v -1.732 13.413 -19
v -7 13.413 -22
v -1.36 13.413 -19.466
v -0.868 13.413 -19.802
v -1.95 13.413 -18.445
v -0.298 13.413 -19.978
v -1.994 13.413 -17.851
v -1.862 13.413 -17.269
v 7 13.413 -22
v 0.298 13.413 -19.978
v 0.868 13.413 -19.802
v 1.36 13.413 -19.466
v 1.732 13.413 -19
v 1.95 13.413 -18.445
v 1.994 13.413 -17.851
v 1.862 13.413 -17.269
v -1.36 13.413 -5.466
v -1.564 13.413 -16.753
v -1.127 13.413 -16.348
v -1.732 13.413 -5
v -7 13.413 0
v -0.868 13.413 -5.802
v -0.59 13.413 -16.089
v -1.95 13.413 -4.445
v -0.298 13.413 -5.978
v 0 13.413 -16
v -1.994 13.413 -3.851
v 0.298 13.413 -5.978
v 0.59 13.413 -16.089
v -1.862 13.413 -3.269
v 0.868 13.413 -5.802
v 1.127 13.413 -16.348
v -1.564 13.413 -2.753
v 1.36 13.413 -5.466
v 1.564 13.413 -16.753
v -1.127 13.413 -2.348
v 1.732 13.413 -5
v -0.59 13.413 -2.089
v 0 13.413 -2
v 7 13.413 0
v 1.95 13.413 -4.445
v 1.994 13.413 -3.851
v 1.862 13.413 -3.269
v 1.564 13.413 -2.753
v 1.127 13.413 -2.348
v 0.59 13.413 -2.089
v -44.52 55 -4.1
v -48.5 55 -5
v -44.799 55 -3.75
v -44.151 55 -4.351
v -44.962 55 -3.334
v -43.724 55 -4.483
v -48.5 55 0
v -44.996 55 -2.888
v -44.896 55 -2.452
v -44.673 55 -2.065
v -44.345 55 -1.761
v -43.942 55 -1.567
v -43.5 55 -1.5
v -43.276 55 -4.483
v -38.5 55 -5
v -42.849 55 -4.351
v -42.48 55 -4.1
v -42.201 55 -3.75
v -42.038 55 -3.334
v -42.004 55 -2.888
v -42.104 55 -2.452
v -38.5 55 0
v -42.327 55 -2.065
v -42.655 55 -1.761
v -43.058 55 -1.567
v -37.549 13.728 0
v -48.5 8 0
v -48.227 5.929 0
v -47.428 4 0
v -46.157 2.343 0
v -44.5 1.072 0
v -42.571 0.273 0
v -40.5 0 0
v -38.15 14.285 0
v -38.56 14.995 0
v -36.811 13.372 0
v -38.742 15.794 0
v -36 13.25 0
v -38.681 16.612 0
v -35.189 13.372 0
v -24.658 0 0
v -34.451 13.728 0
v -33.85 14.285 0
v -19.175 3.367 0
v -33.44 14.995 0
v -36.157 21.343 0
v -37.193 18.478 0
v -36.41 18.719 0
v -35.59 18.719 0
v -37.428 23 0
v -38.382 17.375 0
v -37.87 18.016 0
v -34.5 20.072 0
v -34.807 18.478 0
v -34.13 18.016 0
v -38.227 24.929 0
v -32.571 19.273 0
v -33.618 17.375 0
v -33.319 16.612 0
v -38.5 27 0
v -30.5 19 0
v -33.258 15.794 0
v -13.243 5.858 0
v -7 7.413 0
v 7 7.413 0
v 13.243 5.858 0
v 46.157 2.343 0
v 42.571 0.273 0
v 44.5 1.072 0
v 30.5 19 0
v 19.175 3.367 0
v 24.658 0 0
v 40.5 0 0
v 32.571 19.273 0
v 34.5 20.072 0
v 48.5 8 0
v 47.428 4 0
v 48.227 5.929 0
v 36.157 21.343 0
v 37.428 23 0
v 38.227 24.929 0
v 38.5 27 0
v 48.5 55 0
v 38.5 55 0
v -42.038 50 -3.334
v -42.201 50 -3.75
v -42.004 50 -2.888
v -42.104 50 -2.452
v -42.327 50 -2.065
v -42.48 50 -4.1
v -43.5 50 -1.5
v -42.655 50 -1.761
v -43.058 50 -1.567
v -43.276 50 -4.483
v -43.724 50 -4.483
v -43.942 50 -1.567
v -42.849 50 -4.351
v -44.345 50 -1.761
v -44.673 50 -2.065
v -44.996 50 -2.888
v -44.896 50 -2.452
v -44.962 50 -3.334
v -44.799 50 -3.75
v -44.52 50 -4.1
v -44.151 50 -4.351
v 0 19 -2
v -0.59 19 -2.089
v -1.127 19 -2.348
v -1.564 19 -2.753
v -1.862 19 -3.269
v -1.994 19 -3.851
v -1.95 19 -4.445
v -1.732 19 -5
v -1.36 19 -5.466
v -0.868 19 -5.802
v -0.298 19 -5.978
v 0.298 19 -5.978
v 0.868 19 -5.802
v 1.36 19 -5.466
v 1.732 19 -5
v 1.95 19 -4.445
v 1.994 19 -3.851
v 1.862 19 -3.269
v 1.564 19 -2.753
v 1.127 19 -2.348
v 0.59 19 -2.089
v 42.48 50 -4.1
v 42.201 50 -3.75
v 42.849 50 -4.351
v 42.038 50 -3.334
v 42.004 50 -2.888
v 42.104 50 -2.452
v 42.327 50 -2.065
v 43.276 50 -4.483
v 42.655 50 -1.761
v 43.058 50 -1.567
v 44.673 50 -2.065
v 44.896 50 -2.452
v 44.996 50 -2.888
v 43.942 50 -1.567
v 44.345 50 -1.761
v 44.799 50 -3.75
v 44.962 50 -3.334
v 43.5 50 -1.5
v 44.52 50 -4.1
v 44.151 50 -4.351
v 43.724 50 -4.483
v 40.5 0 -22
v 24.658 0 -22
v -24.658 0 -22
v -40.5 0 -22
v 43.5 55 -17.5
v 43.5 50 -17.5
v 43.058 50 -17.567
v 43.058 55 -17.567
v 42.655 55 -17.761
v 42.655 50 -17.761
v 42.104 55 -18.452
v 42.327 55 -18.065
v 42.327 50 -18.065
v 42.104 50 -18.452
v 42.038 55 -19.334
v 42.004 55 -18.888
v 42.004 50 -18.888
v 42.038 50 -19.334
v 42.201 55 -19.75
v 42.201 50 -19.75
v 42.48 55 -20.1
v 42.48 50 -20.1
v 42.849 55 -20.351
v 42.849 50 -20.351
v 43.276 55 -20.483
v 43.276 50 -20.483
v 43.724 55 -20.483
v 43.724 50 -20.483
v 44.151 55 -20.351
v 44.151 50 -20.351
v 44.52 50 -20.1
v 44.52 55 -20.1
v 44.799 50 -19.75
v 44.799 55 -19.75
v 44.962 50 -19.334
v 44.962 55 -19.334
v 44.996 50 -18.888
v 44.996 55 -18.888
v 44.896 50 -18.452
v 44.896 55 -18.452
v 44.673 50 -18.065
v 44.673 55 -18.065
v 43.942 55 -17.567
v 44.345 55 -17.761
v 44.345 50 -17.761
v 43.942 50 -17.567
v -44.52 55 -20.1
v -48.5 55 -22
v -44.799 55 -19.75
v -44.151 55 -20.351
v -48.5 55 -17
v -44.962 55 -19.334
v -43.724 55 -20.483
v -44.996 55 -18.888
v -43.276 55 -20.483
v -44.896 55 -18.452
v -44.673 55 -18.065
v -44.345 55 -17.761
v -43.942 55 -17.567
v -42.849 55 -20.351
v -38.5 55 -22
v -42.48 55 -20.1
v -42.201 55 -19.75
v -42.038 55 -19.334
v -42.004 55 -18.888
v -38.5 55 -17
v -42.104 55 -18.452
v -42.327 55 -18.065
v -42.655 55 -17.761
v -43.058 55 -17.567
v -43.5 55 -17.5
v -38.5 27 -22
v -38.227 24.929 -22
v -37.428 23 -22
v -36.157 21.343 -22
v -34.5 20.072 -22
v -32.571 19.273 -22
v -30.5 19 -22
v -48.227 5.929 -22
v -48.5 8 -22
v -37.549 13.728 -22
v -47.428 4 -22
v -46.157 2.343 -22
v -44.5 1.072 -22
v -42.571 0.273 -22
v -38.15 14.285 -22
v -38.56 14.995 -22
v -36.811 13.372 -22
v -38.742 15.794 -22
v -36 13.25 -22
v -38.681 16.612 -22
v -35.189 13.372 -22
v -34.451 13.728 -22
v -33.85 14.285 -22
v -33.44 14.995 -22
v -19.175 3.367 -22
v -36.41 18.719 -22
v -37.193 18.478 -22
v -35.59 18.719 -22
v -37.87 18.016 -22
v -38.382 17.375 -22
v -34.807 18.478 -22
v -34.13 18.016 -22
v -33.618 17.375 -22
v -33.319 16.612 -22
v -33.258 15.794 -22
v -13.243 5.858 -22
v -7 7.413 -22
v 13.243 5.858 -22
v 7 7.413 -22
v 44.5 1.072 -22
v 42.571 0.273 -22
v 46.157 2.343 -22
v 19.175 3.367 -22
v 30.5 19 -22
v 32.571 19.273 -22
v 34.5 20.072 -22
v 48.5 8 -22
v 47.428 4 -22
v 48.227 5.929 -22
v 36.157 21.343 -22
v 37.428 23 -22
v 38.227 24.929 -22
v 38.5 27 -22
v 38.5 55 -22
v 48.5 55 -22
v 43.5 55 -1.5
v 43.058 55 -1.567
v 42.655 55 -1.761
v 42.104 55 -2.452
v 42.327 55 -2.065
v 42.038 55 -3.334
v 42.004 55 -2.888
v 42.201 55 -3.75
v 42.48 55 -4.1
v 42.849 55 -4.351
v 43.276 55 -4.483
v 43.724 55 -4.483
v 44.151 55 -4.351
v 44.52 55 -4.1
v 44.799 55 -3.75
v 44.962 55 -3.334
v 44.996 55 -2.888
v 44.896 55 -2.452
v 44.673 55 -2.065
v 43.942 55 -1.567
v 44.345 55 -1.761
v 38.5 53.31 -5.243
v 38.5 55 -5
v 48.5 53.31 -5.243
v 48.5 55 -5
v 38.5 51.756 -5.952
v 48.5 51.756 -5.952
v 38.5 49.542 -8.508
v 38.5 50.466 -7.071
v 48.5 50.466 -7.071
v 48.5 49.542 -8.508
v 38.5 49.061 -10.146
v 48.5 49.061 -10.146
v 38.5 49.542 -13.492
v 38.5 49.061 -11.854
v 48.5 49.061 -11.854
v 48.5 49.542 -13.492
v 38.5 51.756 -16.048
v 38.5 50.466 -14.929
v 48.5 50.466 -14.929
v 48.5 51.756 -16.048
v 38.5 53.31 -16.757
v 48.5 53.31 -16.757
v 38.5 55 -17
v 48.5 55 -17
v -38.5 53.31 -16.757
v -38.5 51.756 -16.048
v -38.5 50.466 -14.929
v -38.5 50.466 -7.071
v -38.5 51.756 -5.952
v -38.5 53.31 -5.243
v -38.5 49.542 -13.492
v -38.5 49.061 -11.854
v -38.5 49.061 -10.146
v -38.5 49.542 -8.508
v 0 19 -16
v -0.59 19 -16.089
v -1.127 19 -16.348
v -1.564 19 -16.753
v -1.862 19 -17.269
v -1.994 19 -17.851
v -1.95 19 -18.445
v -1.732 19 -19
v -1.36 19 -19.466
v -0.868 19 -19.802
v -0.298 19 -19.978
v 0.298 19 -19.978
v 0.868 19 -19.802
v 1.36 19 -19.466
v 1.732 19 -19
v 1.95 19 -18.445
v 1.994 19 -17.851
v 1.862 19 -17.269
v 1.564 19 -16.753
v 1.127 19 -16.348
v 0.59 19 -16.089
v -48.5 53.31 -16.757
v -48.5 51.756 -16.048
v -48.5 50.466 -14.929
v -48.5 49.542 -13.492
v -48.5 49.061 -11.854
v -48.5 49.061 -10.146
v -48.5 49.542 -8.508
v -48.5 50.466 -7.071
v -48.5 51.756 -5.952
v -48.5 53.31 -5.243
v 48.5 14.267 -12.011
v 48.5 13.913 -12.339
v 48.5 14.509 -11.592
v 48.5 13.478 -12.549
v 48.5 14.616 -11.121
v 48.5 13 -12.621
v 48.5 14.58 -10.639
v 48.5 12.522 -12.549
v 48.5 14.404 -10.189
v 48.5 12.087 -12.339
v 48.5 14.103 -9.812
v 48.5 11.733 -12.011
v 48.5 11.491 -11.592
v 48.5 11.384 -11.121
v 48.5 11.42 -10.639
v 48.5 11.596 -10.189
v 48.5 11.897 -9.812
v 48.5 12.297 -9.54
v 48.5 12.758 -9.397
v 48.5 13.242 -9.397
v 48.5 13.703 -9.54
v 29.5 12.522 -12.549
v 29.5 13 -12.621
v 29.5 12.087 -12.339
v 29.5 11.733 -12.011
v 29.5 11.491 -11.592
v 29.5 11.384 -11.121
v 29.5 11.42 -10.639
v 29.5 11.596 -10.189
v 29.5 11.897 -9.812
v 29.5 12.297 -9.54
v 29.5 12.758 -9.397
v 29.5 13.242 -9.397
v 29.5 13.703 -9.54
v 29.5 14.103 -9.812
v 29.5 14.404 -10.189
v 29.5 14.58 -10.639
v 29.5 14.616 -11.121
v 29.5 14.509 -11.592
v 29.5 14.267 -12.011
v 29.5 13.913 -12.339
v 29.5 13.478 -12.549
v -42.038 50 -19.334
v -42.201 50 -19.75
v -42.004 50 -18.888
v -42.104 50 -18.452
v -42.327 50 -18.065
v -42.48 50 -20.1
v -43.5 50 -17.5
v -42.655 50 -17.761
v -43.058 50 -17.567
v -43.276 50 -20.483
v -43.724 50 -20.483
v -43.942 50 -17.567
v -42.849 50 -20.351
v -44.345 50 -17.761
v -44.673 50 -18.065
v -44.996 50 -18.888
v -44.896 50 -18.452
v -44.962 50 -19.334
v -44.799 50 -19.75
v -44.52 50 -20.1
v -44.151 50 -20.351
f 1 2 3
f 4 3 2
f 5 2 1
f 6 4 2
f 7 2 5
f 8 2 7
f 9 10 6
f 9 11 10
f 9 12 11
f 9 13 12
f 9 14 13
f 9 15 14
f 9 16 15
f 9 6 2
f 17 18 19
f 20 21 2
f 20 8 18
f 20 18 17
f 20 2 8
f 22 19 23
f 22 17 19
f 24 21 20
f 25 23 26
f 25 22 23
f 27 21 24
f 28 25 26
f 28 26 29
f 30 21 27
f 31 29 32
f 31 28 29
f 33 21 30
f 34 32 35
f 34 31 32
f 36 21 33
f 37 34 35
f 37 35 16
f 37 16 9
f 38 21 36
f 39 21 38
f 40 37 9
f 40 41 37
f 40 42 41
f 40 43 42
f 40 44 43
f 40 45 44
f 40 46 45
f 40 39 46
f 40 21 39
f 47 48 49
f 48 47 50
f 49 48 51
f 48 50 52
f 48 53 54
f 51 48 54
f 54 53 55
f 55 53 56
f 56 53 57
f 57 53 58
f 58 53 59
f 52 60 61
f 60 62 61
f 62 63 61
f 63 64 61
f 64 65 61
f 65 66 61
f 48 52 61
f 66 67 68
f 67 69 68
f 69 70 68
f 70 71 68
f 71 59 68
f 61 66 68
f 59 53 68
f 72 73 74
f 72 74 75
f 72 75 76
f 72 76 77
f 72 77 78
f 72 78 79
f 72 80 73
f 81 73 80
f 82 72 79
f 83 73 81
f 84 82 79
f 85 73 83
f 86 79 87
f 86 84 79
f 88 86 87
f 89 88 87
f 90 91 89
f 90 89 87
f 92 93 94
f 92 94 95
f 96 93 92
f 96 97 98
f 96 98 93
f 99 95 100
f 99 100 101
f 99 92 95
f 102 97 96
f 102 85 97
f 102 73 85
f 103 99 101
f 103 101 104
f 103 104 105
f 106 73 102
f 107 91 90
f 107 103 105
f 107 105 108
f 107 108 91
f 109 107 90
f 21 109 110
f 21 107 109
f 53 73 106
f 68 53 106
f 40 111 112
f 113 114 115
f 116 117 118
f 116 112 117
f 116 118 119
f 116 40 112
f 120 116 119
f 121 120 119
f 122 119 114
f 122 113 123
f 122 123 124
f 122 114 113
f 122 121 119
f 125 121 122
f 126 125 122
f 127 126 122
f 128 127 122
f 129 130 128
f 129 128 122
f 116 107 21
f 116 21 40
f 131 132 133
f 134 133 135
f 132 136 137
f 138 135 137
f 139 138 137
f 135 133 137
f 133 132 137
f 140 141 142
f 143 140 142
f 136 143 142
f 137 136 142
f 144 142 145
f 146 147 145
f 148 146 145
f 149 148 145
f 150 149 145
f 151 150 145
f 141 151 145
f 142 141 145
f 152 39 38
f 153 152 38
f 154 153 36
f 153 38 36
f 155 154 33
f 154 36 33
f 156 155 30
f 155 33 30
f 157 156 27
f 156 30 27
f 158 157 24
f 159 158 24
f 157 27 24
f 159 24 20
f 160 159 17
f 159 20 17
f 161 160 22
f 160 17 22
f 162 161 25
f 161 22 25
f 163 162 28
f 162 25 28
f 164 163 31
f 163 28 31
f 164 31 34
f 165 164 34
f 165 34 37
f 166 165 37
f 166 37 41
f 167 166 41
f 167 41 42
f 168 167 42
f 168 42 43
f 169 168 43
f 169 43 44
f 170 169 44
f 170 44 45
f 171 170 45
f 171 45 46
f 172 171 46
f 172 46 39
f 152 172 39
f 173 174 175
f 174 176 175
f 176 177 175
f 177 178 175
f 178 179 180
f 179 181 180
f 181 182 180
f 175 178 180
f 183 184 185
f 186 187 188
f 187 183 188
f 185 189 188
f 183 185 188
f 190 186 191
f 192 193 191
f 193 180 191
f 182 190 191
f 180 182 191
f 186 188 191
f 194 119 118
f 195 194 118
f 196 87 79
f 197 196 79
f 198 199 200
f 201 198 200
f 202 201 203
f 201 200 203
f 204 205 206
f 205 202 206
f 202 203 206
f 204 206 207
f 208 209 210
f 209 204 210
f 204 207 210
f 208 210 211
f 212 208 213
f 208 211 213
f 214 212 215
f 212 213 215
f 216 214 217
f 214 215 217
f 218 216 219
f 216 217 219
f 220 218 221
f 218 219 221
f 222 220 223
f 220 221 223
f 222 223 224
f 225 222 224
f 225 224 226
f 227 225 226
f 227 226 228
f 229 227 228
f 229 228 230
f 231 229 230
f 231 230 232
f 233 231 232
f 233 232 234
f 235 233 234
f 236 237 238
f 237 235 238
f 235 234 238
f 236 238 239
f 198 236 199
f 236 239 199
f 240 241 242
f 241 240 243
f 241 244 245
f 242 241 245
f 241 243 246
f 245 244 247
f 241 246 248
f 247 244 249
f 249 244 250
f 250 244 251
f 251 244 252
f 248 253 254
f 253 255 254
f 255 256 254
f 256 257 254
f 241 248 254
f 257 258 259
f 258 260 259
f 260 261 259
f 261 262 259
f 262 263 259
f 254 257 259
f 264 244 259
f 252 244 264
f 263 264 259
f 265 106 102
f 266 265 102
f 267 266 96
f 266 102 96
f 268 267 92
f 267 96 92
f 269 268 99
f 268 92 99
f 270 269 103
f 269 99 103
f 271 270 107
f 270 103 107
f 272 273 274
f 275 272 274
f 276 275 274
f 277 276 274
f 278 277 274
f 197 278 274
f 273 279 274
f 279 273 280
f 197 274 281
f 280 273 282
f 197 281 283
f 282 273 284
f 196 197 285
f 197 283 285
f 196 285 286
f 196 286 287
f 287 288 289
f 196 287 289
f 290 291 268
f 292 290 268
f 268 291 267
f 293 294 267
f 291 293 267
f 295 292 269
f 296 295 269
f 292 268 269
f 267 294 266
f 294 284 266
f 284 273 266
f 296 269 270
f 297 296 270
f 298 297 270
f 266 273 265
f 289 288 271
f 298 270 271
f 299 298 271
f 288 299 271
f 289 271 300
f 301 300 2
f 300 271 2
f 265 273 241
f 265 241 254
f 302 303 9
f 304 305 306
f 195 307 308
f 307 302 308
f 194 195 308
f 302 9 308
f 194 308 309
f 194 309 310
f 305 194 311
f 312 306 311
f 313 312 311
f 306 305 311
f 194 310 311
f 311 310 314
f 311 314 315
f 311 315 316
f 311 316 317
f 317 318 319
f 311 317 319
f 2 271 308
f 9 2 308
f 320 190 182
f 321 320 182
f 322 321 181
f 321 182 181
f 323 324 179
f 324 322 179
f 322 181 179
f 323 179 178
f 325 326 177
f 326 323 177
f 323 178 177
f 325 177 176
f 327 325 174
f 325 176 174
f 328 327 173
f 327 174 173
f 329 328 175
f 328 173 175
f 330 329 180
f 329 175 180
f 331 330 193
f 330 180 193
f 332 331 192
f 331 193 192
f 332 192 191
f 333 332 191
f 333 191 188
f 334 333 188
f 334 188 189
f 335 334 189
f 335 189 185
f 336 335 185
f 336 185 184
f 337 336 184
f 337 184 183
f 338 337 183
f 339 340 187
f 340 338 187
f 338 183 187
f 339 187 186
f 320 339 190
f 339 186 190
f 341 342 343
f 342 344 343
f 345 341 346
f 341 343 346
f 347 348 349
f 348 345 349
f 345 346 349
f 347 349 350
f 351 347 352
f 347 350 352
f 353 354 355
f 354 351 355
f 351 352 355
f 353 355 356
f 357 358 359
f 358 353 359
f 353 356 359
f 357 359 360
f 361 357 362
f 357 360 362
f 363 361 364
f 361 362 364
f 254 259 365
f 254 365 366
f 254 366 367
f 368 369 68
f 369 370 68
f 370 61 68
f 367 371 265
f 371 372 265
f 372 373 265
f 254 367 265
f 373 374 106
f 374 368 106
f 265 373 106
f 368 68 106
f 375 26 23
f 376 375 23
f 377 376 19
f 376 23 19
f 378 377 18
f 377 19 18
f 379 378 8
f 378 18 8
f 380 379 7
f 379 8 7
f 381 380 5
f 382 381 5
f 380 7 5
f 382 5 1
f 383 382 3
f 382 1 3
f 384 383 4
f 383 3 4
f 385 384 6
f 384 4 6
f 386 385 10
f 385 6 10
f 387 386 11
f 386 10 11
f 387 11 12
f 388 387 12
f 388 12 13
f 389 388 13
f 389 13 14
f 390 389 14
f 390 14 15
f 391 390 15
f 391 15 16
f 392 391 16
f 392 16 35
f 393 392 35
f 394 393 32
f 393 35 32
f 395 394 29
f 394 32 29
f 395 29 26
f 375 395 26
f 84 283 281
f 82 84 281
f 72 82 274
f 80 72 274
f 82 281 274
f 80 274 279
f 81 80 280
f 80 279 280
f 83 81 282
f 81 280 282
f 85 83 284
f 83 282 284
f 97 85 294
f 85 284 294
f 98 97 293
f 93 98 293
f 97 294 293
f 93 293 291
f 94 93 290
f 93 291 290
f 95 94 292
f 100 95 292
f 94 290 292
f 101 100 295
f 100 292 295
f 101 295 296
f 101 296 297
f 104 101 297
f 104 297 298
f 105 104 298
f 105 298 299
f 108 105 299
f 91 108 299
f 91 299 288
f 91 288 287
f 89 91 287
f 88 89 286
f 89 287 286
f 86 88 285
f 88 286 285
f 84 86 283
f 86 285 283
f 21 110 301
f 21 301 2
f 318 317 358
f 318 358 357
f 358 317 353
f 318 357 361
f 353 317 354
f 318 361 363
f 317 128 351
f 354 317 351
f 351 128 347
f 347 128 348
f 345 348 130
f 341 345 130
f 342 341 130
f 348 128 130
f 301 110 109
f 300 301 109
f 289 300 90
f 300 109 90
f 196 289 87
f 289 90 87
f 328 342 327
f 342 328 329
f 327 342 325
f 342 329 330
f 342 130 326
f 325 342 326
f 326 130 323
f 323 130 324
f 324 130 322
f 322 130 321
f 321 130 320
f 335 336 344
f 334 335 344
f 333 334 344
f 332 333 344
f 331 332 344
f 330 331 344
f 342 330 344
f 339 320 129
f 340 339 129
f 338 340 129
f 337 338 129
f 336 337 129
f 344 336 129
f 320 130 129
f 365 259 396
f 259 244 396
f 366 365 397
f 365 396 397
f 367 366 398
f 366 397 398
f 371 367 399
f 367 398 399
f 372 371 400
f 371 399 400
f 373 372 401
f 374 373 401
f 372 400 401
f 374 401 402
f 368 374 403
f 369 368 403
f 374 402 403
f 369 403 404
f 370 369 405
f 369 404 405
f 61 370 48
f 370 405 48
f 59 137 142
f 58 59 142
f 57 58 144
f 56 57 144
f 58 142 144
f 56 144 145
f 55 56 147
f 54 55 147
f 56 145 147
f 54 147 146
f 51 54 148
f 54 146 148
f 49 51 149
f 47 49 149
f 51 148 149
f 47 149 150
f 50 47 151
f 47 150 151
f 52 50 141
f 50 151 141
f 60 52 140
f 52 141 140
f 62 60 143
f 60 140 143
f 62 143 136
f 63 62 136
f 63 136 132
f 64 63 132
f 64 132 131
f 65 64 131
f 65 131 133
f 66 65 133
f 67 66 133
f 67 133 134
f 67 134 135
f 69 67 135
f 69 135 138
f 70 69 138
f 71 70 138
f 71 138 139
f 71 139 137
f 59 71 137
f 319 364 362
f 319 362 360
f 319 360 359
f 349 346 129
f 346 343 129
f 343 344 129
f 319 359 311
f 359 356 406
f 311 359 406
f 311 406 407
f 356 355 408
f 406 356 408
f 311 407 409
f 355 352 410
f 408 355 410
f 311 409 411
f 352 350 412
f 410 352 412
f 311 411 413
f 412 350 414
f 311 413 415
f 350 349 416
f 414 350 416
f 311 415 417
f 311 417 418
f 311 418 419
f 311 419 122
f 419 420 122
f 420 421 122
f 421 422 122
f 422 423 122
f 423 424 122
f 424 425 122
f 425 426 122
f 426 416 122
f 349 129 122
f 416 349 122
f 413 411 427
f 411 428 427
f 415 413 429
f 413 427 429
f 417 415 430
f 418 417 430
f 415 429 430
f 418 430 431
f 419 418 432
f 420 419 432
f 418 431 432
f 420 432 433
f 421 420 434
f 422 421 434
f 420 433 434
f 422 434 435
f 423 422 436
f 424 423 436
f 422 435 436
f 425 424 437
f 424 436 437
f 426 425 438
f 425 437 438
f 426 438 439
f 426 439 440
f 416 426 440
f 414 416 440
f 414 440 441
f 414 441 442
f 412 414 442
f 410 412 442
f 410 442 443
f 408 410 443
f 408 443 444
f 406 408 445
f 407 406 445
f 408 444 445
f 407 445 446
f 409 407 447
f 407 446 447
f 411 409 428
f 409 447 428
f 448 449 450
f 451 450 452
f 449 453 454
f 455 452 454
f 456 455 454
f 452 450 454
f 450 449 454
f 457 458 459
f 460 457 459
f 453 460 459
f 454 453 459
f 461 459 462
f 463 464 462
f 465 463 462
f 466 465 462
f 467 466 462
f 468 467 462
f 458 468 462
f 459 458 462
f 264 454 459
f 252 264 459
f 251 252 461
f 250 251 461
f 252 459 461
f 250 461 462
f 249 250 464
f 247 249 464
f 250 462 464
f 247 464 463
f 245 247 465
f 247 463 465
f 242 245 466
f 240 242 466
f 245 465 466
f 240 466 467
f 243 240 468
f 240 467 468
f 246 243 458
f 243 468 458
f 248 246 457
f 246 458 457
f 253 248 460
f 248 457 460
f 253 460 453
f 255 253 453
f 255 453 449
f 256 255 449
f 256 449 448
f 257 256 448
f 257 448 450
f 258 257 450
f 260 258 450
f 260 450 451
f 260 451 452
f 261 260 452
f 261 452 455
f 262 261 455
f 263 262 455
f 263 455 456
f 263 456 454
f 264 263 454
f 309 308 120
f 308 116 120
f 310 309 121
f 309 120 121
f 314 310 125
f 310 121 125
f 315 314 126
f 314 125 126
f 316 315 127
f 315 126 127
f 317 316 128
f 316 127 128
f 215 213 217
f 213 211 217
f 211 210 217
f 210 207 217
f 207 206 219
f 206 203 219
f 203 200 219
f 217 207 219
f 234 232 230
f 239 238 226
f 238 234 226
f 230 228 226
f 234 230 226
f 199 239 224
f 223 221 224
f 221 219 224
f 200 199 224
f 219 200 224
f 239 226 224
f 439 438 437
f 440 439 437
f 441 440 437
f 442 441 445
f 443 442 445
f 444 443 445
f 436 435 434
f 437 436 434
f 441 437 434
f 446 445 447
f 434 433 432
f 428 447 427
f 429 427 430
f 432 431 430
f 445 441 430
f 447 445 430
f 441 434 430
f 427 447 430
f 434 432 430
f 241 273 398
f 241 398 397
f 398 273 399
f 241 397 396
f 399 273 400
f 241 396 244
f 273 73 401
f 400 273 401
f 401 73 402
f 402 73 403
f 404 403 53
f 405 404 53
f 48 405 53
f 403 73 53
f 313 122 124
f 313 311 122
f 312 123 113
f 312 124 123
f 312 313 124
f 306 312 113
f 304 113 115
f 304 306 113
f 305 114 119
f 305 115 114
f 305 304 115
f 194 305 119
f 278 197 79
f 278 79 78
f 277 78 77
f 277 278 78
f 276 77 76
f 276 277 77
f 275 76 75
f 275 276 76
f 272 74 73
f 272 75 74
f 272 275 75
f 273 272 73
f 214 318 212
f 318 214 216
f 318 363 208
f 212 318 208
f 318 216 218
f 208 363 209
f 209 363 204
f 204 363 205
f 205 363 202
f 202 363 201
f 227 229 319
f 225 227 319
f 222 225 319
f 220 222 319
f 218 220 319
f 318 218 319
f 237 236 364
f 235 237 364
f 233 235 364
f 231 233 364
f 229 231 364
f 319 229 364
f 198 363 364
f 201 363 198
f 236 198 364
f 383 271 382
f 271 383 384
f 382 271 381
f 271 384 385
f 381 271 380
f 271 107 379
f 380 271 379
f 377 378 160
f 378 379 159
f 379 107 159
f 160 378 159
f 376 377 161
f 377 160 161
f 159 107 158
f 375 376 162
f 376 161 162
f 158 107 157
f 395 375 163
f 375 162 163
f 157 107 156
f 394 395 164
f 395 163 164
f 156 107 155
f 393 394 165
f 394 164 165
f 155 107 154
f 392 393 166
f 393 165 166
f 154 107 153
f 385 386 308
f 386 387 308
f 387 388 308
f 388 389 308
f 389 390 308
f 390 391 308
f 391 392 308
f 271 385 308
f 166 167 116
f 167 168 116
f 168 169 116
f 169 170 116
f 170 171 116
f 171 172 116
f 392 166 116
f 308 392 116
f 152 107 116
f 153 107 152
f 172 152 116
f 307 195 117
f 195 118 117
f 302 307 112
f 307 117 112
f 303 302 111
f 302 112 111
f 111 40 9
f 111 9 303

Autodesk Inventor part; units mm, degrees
ref_plane "YZ Plane" through (0, 0, 0) normal (1, 0, 0) x (0, 1, 0)
ref_plane "XZ Plane" through (0, 0, 0) normal (0, 1, 0) x (-1, 0, 0)
ref_plane "XY Plane" through (0, 0, 0) normal (0, 0, 1) x (1, 0, 0)
sketch "Sketch1" plane through (0, 0, 0) normal (0, 0, 1) x (1, 0, 0)
  line L0 (-48.5, 0) -> (-48.5, 55)
  line L1 (-48.5, 55) -> (-38.5, 55)
  line L2 (-38.5, 55) -> (-38.5, 27)
  line L3 (-30.5, 19) -> (30.5, 19)
  line L4 (38.5, 27) -> (38.5, 55)
  line L5 (38.5, 55) -> (48.5, 55)
  line L6 (48.5, 55) -> (48.5, 0)
  line L7 (48.5, 0) -> (-48.5, 0)
  arc A0 (-38.5, 27) -> (-30.5, 19) centre (-30.5, 27) ccw
  arc A1 (30.5, 19) -> (38.5, 27) centre (30.5, 27) ccw
  line L8 (0, 0) -> (0, 59.4805) construction
  point P0 (0, 0)
  point P1 (0, 19)
  dimension "d0" = 10
  dimension "d1" = 19
  dimension "d2" = 36
  dimension "d3" = 8
  dimension "d4" = 97
extrude "Extrusion1" add sketch "Sketch1" against normal blind 22
sketch "Sketch2" plane through (0, 0, 0) normal (0, 0, 1) x (1, 0, 0)
  arc A0 (24.6577, 0) -> (-24.6577, 0) centre (0, -34) ccw
  line L0 (-48.5, 0) -> (48.5, 0) projected
  line L1 (-24.6577, 0) -> (24.6577, 0)
  point P0 (0, 0)
  point P1 (0, 0)
  point P2 (0, 0)
  point P3 (-24.6577, 0)
  point P4 (24.6577, 0)
  dimension "d7" = 84
  dimension "d8" = 8
extrude "Extrusion2" cut sketch "Sketch2" against normal up to surface (22 mm away)
sketch "Sketch3" plane through (0, 0, 0) normal (0, 0, 1) x (1, 0, 0)
  arc A0 (24.6577, 0) -> (-24.6577, 0) centre (0, -34) ccw projected
  line L0 (-7, 7.4126) -> (-7, 13.4126)
  line L1 (-7, 13.4126) -> (7, 13.4126)
  line L2 (7, 13.4126) -> (7, 7.4126)
  line L3 (0, 0) -> (0, 19) construction
  line L4 (30.5, 19) -> (-30.5, 19) projected
  dimension "d11" = 14
  dimension "d12" = 6
extrude "Extrusion3" cut sketch "Sketch3" against normal up to surface (22 mm away)
sketch "Sketch4" plane through (0, 0, 0) normal (0, 0, 1) x (1, 0, 0)
  line L0 (-48.5, 55) -> (-48.5, 0) projected
  line L1 (-48.5, 0) -> (-24.6577, 0) projected
  point P0 (0, 0)
  point P1 (-36, 16)
  dimension "d22" = 12.5
  dimension "d23" = 16
hole "Hole1" at (-36, 16, 0) direction (0, 0, -1) diameter 5.5 depth 22
sketch "Sketch5" plane through (-48.5, 0, 0) normal (-1, 0, 0) x (0, 0, 1)
  line L0 (0, 55) -> (-22, 55) projected
  arc A0 (-17, 55) -> (-5, 55) centre (-11, 55) ccw
  line L1 (-17, 55) -> (-5, 55)
  point P0 (0, 0)
  point P1 (-5, 55)
  dimension "d24" = 12
extrude "Extrusion4" cut sketch "Sketch5" against normal up to surface (10 mm away)
mirror "Mirror1" about plane through (0, 0, 0) normal (1, 0, 0) of "Extrusion4"
sketch "Sketch6" plane through (-48.5, 55, 0) normal (0, 1, 0) x (1, 0, 0)
  line L0 (0, 5) -> (0, 17) projected
  line L1 (0, 22) -> (10, 22) projected
  point P0 (48.5, 0)
  point P1 (5, 19)
  point P2 (5, 3)
  point P3 (0, 11)
  point P4 (5, 22)
  dimension "d27" = 8
  dimension "d28" = 8
hole "Hole2" at (-43.5, 55, -19) at (-43.5, 55, -3) direction (0, -1, 0) diameter 3 depth 5
mirror "Mirror2" about plane through (0, 0, 0) normal (1, 0, 0) of "Hole2"
fillet "Fillet1" radius 8 2 edges at (48.5, 0, -11) (-48.5, 0, -11)
sketch "Sketch7" plane through (48.5, 55, -11) normal (1, 0, 0) x (0, 0, -1)
  line L0 (-11, -55) -> (11, -55) projected
  point P0 (0, -42)
  point P1 (0, -55)
  dimension "d44" = 13
hole "Hole3" at (48.5, 13, -11) direction (-1, 0, 0) diameter 3.242 depth 19 thread size "M4x0.7" class "6H" standard "ISO Metric profile"
sketch "Sketch8" plane through (-30.5, 19, 0) normal (0, 1, 0) x (1, 0, 0)
  line L0 (-8, 17) -> (-8, 5) projected
  circle A0 centre (-13, 3) radius 1.5 projected
  circle A1 centre (-13, 19) radius 1.5 projected
  point P0 (30.5, 0)
  point P1 (30.5, 18)
  point P2 (30.5, 4)
  point P3 (-8, 11)
  dimension "d52" = 7
  dimension "d53" = 7
  dimension "d54" = 43.5
  dimension "d55" = 43.5
hole "Hole4" at (0, 19, -18) at (0, 19, -4) direction (0, -1, 0) diameter 4 end through all
sketch "Skizze9" plane through (0, 0, 0) normal (0, 0, 1) x (1, 0, 0)
  circle A0 centre (-36, 16) radius 2.75 projected
  arc A1 (-48.5, 8) -> (-40.5, 0) centre (-40.5, 8) ccw projected
  line L0 (-40.5, 0) -> (-24.6577, 0) projected
  arc A2 (-7, 7.4126) -> (-24.6577, 0) centre (0, -34) ccw projected
  line L1 (-7, 7.4126) -> (-7, 13.4126) projected
  line L2 (-7, 13.4126) -> (7, 13.4126) projected
  line L3 (7, 13.4126) -> (7, 7.4126) projected
  arc A3 (24.6577, 0) -> (7, 7.4126) centre (0, -34) ccw projected
  line L4 (24.6577, 0) -> (40.5, 0) projected
  arc A4 (40.5, 0) -> (48.5, 8) centre (40.5, 8) ccw projected
  line L5 (48.5, 8) -> (48.5, 55) projected
  line L6 (48.5, 55) -> (38.5, 55) projected
  line L7 (38.5, 55) -> (38.5, 27) projected
  arc A5 (30.5, 19) -> (38.5, 27) centre (30.5, 27) ccw projected
  line L8 (30.5, 19) -> (-30.5, 19) projected
  arc A6 (-38.5, 27) -> (-30.5, 19) centre (-30.5, 27) ccw projected
  line L9 (-38.5, 27) -> (-38.5, 55) projected
  line L10 (-38.5, 55) -> (-48.5, 55) projected
  line L11 (-48.5, 55) -> (-48.5, 8) projected
  arc A7 (24.6577, 0) -> (-24.6577, 0) centre (0, -34) ccw
  point P0 (0, 0)
equation "\"d28\" = d27"
equation "\"d53\" = d52"
properties part number "145 part 2" material "Aluminum 6061-AHC"
